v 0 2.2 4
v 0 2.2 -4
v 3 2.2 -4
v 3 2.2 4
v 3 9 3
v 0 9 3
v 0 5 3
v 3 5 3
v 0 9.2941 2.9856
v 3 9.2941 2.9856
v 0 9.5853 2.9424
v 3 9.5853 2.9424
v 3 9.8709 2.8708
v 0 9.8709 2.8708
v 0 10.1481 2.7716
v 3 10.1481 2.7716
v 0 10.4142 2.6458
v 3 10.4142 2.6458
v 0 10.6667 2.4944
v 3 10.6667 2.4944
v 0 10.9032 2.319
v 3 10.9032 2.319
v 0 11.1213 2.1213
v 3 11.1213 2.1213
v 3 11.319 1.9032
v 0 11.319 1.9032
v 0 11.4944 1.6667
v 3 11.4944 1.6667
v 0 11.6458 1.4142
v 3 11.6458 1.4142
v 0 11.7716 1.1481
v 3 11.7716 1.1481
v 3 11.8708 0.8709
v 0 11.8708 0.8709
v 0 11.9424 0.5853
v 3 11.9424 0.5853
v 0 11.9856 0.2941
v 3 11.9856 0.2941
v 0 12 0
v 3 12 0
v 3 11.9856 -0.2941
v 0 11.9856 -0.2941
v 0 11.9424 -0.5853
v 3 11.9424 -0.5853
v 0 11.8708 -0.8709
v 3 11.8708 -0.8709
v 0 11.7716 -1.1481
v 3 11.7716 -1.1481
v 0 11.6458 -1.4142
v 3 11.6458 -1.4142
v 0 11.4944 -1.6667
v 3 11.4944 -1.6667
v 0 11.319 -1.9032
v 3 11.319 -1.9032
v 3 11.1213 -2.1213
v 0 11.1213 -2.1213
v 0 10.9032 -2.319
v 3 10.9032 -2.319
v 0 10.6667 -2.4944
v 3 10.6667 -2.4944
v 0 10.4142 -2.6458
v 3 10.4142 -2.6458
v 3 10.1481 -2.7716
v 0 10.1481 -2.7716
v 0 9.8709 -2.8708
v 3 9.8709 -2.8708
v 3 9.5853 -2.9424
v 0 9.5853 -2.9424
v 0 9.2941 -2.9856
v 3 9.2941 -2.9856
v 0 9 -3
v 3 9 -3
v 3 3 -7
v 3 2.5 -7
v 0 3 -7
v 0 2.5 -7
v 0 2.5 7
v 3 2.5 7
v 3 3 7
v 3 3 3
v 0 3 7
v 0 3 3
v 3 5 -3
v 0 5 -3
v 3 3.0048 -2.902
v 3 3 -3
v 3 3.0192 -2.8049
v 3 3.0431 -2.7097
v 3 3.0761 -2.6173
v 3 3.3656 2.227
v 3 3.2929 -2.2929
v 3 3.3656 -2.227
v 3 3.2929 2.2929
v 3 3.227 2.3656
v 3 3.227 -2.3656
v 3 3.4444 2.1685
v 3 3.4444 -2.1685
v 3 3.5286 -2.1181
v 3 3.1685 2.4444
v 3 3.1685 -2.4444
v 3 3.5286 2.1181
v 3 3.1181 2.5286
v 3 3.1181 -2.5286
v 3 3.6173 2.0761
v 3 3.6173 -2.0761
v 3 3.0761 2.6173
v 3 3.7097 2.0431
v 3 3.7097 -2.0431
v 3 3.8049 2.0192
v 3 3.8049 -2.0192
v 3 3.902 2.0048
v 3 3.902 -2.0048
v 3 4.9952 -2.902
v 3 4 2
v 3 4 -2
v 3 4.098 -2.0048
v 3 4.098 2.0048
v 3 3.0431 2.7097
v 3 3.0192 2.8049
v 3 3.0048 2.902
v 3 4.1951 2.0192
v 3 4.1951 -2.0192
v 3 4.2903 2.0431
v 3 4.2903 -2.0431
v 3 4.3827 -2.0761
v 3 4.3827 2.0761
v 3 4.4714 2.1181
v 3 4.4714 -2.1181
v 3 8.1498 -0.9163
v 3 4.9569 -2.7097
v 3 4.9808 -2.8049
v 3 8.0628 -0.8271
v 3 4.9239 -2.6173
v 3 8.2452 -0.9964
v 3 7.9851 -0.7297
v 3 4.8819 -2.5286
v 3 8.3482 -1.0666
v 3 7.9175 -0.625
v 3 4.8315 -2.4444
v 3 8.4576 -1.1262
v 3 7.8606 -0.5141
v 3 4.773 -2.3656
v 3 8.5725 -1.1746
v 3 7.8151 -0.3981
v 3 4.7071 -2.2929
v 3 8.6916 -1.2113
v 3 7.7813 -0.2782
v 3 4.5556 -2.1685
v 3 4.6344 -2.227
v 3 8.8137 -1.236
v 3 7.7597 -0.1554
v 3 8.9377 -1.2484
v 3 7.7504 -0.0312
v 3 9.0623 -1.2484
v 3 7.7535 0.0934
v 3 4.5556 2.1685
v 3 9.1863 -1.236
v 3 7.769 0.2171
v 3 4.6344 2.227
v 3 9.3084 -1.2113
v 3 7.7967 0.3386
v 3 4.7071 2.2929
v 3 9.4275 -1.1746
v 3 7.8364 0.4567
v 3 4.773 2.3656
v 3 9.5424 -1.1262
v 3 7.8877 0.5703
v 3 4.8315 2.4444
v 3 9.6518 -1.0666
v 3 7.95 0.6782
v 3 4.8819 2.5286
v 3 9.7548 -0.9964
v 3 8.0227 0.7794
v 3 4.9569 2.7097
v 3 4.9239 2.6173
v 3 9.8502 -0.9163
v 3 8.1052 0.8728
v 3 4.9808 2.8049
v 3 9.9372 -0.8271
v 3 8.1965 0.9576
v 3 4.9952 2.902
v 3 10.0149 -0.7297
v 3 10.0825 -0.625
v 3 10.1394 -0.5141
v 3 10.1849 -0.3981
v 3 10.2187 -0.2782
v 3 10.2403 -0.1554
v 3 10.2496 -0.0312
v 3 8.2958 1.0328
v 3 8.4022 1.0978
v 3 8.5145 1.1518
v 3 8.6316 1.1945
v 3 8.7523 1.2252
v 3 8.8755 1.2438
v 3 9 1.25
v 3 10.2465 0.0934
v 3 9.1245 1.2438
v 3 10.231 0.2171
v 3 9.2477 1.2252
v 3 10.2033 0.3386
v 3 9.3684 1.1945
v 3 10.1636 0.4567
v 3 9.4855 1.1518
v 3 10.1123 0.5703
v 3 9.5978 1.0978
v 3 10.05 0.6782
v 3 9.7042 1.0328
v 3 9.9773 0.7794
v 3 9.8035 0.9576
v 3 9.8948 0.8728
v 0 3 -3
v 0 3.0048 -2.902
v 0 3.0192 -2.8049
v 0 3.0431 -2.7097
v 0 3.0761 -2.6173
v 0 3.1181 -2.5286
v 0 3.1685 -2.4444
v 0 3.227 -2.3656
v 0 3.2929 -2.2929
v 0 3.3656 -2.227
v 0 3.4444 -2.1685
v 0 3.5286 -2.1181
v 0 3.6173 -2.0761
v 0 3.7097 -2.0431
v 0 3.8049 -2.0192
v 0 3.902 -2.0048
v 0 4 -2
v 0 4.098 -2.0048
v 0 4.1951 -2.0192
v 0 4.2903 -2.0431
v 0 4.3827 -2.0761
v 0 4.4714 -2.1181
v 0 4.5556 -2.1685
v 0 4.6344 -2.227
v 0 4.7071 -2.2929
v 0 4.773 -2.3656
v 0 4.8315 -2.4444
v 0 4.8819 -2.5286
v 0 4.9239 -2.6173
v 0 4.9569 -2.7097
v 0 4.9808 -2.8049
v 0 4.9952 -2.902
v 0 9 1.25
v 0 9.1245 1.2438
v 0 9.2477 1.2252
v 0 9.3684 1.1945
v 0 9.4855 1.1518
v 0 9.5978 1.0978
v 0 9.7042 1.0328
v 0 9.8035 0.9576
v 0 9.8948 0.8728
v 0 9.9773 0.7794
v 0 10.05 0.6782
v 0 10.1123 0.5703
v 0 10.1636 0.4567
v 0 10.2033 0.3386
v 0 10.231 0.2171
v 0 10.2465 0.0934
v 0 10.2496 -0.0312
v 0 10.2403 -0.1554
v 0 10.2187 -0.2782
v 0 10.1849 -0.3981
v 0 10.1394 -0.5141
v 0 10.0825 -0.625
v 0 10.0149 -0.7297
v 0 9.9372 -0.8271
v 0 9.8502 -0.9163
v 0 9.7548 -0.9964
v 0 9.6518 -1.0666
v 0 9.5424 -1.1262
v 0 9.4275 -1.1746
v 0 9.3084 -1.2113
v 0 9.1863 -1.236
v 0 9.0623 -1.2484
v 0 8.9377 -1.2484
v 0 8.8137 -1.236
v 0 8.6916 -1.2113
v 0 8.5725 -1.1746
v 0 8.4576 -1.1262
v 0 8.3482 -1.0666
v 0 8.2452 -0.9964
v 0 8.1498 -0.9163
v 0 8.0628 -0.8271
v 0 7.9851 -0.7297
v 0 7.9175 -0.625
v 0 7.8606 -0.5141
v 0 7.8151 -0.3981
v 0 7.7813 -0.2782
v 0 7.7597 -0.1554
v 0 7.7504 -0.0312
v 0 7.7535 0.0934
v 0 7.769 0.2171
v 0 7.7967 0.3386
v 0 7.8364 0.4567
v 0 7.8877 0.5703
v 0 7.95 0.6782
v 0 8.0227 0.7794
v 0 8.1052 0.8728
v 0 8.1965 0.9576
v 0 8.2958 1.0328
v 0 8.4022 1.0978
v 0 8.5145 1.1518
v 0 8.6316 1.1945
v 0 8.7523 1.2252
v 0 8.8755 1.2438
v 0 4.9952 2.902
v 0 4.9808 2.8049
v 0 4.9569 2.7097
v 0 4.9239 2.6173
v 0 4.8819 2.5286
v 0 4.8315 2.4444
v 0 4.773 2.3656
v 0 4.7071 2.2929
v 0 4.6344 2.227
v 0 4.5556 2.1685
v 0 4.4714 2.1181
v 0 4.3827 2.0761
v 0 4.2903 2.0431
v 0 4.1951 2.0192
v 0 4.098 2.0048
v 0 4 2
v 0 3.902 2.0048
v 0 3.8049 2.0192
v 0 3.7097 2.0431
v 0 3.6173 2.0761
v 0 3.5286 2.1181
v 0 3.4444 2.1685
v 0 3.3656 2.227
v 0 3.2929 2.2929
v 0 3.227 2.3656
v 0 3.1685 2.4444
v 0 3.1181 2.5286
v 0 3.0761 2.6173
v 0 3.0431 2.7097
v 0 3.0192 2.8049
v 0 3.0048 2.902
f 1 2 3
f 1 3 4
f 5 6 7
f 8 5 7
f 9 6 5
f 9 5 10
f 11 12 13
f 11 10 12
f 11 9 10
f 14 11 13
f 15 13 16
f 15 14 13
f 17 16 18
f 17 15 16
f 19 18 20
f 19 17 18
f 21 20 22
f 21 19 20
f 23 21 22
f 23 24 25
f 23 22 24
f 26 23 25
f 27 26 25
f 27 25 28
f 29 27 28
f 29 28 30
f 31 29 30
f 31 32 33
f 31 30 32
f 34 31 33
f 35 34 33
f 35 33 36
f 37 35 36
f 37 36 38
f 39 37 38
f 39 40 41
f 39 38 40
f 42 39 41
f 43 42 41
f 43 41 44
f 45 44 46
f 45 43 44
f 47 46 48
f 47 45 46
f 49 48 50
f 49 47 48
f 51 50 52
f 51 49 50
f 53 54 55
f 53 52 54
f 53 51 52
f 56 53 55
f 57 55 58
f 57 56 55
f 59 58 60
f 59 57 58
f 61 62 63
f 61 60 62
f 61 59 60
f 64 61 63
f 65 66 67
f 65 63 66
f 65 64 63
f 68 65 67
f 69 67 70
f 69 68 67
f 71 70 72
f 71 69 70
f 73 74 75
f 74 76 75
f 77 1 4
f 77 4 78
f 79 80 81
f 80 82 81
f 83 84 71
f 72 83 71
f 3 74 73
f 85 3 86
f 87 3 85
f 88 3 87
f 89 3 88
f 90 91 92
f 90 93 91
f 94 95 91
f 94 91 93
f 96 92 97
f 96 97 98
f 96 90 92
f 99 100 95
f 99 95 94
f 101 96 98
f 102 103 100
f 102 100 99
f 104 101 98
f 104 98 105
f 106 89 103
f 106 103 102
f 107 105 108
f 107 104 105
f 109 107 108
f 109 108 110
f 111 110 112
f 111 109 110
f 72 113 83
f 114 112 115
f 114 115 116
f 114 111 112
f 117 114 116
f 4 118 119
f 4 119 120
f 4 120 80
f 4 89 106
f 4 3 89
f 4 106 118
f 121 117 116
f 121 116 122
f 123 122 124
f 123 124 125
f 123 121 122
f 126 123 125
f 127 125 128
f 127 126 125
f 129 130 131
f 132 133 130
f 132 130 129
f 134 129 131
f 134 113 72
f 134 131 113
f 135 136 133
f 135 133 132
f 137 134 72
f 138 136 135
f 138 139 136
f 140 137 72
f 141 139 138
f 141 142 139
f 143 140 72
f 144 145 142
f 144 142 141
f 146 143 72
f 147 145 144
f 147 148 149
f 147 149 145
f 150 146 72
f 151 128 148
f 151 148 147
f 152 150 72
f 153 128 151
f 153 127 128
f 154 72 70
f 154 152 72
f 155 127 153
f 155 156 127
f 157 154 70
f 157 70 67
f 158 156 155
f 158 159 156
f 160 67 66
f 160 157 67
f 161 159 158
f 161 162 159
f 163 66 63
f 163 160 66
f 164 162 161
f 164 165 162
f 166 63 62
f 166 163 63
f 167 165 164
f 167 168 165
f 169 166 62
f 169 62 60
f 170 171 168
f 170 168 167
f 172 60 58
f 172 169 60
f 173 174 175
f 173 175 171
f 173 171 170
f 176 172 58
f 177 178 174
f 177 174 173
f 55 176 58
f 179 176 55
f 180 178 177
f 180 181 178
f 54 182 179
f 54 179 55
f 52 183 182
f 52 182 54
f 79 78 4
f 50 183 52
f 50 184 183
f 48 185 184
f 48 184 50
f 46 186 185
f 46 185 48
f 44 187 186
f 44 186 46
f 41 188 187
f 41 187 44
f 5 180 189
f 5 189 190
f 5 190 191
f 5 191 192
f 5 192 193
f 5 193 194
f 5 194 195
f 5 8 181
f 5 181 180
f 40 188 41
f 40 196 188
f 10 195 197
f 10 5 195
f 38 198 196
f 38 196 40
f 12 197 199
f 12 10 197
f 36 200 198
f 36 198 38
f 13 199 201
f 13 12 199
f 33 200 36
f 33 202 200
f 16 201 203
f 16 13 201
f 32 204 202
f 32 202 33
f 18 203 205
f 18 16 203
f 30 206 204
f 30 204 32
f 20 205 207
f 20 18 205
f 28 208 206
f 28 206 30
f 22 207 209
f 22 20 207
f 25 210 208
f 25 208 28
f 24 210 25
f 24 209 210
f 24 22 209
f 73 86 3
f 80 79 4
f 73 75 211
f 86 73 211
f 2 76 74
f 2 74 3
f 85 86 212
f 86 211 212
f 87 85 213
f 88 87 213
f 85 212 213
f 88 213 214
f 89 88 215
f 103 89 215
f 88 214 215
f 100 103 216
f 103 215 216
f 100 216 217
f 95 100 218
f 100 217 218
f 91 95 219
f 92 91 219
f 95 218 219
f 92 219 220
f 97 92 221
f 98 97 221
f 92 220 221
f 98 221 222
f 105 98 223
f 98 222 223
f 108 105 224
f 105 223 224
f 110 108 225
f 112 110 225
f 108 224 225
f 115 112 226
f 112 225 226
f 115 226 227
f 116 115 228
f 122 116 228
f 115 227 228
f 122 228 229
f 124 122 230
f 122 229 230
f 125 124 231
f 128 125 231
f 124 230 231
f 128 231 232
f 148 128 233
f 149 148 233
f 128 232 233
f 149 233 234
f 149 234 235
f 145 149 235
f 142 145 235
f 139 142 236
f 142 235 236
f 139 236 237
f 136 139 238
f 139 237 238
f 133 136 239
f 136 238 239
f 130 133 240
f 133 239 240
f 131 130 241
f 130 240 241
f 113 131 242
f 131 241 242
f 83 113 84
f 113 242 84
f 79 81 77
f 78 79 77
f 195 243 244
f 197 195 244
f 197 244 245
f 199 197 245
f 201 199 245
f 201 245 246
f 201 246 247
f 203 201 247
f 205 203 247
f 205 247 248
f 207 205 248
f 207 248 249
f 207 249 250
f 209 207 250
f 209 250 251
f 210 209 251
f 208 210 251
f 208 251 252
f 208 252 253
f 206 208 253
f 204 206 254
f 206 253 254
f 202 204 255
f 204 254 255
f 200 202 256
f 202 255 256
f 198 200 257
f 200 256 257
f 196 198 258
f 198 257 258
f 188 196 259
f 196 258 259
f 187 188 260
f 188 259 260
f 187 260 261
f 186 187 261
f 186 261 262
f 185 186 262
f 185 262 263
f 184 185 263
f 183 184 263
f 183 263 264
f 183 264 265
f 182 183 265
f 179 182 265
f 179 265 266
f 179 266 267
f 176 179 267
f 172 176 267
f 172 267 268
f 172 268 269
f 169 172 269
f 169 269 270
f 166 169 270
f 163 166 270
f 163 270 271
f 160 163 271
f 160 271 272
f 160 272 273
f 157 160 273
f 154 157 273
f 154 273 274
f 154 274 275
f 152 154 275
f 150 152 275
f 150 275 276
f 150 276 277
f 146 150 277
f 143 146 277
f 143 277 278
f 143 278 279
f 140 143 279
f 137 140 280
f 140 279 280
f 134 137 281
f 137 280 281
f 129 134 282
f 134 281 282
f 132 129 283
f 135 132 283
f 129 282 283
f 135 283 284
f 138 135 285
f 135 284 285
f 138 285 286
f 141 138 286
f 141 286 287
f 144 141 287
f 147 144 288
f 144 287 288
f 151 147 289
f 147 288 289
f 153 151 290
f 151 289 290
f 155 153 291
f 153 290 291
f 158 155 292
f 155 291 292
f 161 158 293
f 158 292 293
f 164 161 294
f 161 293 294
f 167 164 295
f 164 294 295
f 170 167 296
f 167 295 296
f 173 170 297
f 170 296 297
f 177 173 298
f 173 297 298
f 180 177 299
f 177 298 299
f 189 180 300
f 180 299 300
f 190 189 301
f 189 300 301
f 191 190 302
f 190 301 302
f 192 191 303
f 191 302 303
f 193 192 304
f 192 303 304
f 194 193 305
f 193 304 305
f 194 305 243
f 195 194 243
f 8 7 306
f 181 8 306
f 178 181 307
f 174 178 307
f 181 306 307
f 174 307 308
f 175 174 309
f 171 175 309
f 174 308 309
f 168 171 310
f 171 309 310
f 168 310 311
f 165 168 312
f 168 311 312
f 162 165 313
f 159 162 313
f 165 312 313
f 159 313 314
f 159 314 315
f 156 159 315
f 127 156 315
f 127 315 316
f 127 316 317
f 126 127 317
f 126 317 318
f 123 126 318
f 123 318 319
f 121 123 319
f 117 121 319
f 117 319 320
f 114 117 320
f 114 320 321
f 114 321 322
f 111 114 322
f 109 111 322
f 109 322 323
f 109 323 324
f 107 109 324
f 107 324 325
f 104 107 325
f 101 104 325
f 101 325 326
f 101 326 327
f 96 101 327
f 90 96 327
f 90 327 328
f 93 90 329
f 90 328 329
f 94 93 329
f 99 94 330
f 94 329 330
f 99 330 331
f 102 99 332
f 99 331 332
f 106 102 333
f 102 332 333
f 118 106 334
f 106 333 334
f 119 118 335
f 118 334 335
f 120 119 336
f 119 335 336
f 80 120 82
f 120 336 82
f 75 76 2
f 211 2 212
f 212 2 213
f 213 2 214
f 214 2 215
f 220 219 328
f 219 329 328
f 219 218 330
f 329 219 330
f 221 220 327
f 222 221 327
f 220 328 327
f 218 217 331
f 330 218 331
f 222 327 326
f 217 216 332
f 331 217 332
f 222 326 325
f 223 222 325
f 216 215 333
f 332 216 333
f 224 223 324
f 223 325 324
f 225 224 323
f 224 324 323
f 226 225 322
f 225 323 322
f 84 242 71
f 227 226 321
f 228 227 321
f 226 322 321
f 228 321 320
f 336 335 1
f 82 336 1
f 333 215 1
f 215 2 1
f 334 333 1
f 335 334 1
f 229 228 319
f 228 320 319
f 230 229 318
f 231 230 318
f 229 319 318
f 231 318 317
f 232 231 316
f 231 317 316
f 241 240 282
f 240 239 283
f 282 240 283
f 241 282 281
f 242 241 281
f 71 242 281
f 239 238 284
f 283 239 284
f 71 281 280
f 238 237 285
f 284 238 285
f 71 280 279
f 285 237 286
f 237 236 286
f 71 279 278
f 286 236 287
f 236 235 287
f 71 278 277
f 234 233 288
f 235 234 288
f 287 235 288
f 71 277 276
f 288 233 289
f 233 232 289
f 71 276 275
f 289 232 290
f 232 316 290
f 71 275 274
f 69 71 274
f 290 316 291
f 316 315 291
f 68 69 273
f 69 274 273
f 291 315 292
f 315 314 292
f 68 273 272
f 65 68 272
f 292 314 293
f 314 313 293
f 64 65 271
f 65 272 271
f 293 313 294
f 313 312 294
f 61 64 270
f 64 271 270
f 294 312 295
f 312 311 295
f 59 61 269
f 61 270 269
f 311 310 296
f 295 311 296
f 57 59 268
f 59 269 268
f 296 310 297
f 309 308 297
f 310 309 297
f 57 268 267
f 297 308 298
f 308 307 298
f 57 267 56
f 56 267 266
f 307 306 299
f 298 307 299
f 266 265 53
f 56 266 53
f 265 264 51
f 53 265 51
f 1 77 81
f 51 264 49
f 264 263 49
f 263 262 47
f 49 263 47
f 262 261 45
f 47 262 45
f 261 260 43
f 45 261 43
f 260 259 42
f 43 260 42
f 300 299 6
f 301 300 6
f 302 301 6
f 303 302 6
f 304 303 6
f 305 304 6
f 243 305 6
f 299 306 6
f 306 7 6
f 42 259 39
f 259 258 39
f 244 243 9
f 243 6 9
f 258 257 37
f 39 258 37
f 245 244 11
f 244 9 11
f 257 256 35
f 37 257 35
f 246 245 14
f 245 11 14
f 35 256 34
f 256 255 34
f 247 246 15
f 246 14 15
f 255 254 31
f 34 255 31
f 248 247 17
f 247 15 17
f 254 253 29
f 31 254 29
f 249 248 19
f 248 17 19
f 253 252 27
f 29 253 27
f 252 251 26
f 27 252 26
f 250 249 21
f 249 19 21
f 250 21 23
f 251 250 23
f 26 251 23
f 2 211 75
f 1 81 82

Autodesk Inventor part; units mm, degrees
ref_plane "YZ Plane" through (0, 0, 0) normal (1, 0, 0) x (0, 1, 0)
ref_plane "XZ Plane" through (0, 0, 0) normal (0, 1, 0) x (-1, 0, 0)
ref_plane "XY Plane" through (0, 0, 0) normal (0, 0, 1) x (1, 0, 0)
sketch "スケッチ1" plane through (0, 0, 0) normal (1, 0, 0) x (0, 1, 0)
  line L0 (9, 0) -> (-9, 0) construction
  line L1 (9, 3) -> (-9, 3)
  line L2 (-9, -3) -> (9, -3)
  arc A0 (9, -3) -> (9, 3) centre (9, 0) ccw
  arc A1 (-9, 3) -> (-9, -3) centre (-9, 0) ccw
  line L3 (3, 7) -> (-3, 7)
  line L4 (-3, -7) -> (3, -7)
  line L5 (3, 7) -> (-3, -7) construction
  line L6 (-3, 7) -> (3, -7) construction
  line L7 (-3, 7) -> (-3, 5)
  line L8 (3, 5) -> (3, 7)
  line L9 (3, -7) -> (3, -5)
  line L10 (3, -3) -> (3, 3)
  line L11 (-3, 3) -> (-3, -3)
  line L12 (-3, -5) -> (-3, -7)
  circle A2 centre (-9, 0) radius 1.25
  circle A3 centre (9, 0) radius 1.25
  line L13 (3, -5) -> (3, -3)
  line L14 (3, 3) -> (3, 5)
  line L15 (-3, 5) -> (-3, 3)
  line L16 (-3, -3) -> (-3, -5)
  point P0 (0, 0)
  dimension "d0" = 6
  dimension "d1" = 6
  dimension "d3" = 14
  dimension "d4" = 18
  dimension "d7" = 0
  dimension "d8" = 6
  dimension "d9" = 4
  dimension "d11" = 2.5
  dimension "d12" = 2.5
extrude "押し出し1" add sketch "スケッチ1" along normal blind 3 contours A0 L2 L10 L1 | L10 L2 L11 L1 | L1 L15 L7 L3 L8 L14 | L11 L2 A1 L1 | L13 L9 L4 L12 L16 L2 | A2 | A3
sketch "スケッチ2" plane through (0, 0, 0) normal (-1, 0, 0) x (0, 0, 1)
  spline S0 degree 3 poles (-3.8743, -1.25) (-3.891, -1.25) (-3.9108, -1.2467) (-3.9405, -1.236) (-3.956, -1.2272) (-3.9769, -1.209) (-3.9865, -1.1969) (-3.9969, -1.1748) (-4, -1.1615) (-4, -1.15) knots -0.016775 -0.016775 -0.016775 -0.016775 -0.011755 -0.011755 -0.007303 -0.007303 -0.003437 -0.003437 0 0 0 0
  line L0 (-4, -1.15) -> (-4, 1.15)
  spline S1 degree 3 poles (-4, 1.15) (-4, 1.1615) (-3.9969, 1.1748) (-3.9865, 1.1969) (-3.9769, 1.209) (-3.956, 1.2272) (-3.9405, 1.236) (-3.9108, 1.2467) (-3.891, 1.25) (-3.8743, 1.25) knots 0 0 0 0 0.003437 0.003437 0.007303 0.007303 0.011755 0.011755 0.016775 0.016775 0.016775 0.016775
  line L1 (-3.8743, 1.25) -> (-3.1638, 1.25)
  line L2 (-3.1638, 1.25) -> (-3.1638, 0.47)
  spline S2 degree 3 poles (-3.1638, 0.47) (-3.2063, 0.4464) (-3.2462, 0.4188) (-3.3386, 0.3411) (-3.3965, 0.2704) (-3.4581, 0.1426) (-3.4766, 0.0658) (-3.4766, 0) (-3.4766, -0.0658) (-3.4581, -0.1426) (-3.3965, -0.2704) (-3.3386, -0.3411) (-3.2462, -0.4188) (-3.2063, -0.4464) (-3.1638, -0.47) knots -0.055942 -0.055942 -0.055942 -0.055942 -0.042582 -0.042582 -0.019736 -0.019736 0 0 0 0.019736 0.019736 0.042582 0.042582 0.055942 0.055942 0.055942 0.055942
  line L3 (-3.1638, -0.47) -> (-3.1638, -1.25)
  line L4 (-3.1638, -1.25) -> (-3.8743, -1.25)
  spline S3 degree 3 poles (4, -1.15) (4, -1.1615) (3.9969, -1.1748) (3.9865, -1.1969) (3.9769, -1.209) (3.956, -1.2272) (3.9405, -1.236) (3.9108, -1.2467) (3.891, -1.25) (3.8743, -1.25) knots 0 0 0 0 0.003437 0.003437 0.007303 0.007303 0.011755 0.011755 0.016775 0.016775 0.016775 0.016775
  line L5 (3.8743, -1.25) -> (3.1638, -1.25)
  line L6 (3.1638, -1.25) -> (3.1638, -0.47)
  spline S4 degree 3 poles (3.1638, -0.47) (3.2063, -0.4464) (3.2462, -0.4188) (3.3386, -0.3411) (3.3965, -0.2704) (3.4581, -0.1426) (3.4766, -0.0658) (3.4766, 0) (3.4766, 0.0658) (3.4581, 0.1426) (3.3965, 0.2704) (3.3386, 0.3411) (3.2462, 0.4188) (3.2063, 0.4464) (3.1638, 0.47) knots -0.055942 -0.055942 -0.055942 -0.055942 -0.042582 -0.042582 -0.019736 -0.019736 0 0 0 0.019736 0.019736 0.042582 0.042582 0.055942 0.055942 0.055942 0.055942
  line L7 (3.1638, 0.47) -> (3.1638, 1.25)
  line L8 (3.1638, 1.25) -> (3.8743, 1.25)
  spline S5 degree 3 poles (3.8743, 1.25) (3.891, 1.25) (3.9108, 1.2467) (3.9405, 1.236) (3.956, 1.2272) (3.9769, 1.209) (3.9865, 1.1969) (3.9969, 1.1748) (4, 1.1615) (4, 1.15) knots -0.016775 -0.016775 -0.016775 -0.016775 -0.011755 -0.011755 -0.007303 -0.007303 -0.003437 -0.003437 0 0 0 0
  line L9 (4, 1.15) -> (4, -1.15)
  circle A0 centre (0, 9) radius 1.25 projected
  circle A1 centre (0, -9) radius 1.25 projected
  line L10 (-3, 3) -> (-7, 3) projected
  line L11 (-7, 3) -> (-7, -3) projected
  line L12 (-7, -3) -> (-3, -3) projected
  line L13 (-3, -3) -> (-3, -9) projected
  arc A2 (-3, -9) -> (3, -9) centre (0, -9) ccw projected
  line L14 (3, -9) -> (3, -3) projected
  line L15 (3, -3) -> (7, -3) projected
  line L16 (7, -3) -> (7, 3) projected
  line L17 (7, 3) -> (3, 3) projected
  line L18 (3, 3) -> (3, 9) projected
  arc A3 (3, 9) -> (-3, 9) centre (0, 9) ccw projected
  line L19 (-3, 9) -> (-3, 3) projected
  line L20 (-7, 2.5) -> (-4, 2.2)
  line L21 (-4, 2.2) -> (4, 2.2)
  line L22 (4, 2.2) -> (7, 2.5)
  arc A4 (-3, 3) -> (-3, 5) centre (-3, 4) ccw
  arc A5 (3, 5) -> (3, 3) centre (3, 4) ccw
  line L23 (3, 3) -> (3, 9) projected
  line L24 (-3, 9) -> (-3, 3) projected
  point P0 (0, 0)
  point P1 (0, 2.2)
  dimension "d15" = 2
  dimension "d17" = 8
  dimension "d18" = 0.8
  dimension "d19" = 0.5
extrude "押し出し4" cut sketch "スケッチ2" against normal through all contours A4 L19 A3 L18 A5 L17 L16 L22 L21 L20 L11 L10 keep common part
properties part number "tip2" material "アルミニウム 2014-T4"
